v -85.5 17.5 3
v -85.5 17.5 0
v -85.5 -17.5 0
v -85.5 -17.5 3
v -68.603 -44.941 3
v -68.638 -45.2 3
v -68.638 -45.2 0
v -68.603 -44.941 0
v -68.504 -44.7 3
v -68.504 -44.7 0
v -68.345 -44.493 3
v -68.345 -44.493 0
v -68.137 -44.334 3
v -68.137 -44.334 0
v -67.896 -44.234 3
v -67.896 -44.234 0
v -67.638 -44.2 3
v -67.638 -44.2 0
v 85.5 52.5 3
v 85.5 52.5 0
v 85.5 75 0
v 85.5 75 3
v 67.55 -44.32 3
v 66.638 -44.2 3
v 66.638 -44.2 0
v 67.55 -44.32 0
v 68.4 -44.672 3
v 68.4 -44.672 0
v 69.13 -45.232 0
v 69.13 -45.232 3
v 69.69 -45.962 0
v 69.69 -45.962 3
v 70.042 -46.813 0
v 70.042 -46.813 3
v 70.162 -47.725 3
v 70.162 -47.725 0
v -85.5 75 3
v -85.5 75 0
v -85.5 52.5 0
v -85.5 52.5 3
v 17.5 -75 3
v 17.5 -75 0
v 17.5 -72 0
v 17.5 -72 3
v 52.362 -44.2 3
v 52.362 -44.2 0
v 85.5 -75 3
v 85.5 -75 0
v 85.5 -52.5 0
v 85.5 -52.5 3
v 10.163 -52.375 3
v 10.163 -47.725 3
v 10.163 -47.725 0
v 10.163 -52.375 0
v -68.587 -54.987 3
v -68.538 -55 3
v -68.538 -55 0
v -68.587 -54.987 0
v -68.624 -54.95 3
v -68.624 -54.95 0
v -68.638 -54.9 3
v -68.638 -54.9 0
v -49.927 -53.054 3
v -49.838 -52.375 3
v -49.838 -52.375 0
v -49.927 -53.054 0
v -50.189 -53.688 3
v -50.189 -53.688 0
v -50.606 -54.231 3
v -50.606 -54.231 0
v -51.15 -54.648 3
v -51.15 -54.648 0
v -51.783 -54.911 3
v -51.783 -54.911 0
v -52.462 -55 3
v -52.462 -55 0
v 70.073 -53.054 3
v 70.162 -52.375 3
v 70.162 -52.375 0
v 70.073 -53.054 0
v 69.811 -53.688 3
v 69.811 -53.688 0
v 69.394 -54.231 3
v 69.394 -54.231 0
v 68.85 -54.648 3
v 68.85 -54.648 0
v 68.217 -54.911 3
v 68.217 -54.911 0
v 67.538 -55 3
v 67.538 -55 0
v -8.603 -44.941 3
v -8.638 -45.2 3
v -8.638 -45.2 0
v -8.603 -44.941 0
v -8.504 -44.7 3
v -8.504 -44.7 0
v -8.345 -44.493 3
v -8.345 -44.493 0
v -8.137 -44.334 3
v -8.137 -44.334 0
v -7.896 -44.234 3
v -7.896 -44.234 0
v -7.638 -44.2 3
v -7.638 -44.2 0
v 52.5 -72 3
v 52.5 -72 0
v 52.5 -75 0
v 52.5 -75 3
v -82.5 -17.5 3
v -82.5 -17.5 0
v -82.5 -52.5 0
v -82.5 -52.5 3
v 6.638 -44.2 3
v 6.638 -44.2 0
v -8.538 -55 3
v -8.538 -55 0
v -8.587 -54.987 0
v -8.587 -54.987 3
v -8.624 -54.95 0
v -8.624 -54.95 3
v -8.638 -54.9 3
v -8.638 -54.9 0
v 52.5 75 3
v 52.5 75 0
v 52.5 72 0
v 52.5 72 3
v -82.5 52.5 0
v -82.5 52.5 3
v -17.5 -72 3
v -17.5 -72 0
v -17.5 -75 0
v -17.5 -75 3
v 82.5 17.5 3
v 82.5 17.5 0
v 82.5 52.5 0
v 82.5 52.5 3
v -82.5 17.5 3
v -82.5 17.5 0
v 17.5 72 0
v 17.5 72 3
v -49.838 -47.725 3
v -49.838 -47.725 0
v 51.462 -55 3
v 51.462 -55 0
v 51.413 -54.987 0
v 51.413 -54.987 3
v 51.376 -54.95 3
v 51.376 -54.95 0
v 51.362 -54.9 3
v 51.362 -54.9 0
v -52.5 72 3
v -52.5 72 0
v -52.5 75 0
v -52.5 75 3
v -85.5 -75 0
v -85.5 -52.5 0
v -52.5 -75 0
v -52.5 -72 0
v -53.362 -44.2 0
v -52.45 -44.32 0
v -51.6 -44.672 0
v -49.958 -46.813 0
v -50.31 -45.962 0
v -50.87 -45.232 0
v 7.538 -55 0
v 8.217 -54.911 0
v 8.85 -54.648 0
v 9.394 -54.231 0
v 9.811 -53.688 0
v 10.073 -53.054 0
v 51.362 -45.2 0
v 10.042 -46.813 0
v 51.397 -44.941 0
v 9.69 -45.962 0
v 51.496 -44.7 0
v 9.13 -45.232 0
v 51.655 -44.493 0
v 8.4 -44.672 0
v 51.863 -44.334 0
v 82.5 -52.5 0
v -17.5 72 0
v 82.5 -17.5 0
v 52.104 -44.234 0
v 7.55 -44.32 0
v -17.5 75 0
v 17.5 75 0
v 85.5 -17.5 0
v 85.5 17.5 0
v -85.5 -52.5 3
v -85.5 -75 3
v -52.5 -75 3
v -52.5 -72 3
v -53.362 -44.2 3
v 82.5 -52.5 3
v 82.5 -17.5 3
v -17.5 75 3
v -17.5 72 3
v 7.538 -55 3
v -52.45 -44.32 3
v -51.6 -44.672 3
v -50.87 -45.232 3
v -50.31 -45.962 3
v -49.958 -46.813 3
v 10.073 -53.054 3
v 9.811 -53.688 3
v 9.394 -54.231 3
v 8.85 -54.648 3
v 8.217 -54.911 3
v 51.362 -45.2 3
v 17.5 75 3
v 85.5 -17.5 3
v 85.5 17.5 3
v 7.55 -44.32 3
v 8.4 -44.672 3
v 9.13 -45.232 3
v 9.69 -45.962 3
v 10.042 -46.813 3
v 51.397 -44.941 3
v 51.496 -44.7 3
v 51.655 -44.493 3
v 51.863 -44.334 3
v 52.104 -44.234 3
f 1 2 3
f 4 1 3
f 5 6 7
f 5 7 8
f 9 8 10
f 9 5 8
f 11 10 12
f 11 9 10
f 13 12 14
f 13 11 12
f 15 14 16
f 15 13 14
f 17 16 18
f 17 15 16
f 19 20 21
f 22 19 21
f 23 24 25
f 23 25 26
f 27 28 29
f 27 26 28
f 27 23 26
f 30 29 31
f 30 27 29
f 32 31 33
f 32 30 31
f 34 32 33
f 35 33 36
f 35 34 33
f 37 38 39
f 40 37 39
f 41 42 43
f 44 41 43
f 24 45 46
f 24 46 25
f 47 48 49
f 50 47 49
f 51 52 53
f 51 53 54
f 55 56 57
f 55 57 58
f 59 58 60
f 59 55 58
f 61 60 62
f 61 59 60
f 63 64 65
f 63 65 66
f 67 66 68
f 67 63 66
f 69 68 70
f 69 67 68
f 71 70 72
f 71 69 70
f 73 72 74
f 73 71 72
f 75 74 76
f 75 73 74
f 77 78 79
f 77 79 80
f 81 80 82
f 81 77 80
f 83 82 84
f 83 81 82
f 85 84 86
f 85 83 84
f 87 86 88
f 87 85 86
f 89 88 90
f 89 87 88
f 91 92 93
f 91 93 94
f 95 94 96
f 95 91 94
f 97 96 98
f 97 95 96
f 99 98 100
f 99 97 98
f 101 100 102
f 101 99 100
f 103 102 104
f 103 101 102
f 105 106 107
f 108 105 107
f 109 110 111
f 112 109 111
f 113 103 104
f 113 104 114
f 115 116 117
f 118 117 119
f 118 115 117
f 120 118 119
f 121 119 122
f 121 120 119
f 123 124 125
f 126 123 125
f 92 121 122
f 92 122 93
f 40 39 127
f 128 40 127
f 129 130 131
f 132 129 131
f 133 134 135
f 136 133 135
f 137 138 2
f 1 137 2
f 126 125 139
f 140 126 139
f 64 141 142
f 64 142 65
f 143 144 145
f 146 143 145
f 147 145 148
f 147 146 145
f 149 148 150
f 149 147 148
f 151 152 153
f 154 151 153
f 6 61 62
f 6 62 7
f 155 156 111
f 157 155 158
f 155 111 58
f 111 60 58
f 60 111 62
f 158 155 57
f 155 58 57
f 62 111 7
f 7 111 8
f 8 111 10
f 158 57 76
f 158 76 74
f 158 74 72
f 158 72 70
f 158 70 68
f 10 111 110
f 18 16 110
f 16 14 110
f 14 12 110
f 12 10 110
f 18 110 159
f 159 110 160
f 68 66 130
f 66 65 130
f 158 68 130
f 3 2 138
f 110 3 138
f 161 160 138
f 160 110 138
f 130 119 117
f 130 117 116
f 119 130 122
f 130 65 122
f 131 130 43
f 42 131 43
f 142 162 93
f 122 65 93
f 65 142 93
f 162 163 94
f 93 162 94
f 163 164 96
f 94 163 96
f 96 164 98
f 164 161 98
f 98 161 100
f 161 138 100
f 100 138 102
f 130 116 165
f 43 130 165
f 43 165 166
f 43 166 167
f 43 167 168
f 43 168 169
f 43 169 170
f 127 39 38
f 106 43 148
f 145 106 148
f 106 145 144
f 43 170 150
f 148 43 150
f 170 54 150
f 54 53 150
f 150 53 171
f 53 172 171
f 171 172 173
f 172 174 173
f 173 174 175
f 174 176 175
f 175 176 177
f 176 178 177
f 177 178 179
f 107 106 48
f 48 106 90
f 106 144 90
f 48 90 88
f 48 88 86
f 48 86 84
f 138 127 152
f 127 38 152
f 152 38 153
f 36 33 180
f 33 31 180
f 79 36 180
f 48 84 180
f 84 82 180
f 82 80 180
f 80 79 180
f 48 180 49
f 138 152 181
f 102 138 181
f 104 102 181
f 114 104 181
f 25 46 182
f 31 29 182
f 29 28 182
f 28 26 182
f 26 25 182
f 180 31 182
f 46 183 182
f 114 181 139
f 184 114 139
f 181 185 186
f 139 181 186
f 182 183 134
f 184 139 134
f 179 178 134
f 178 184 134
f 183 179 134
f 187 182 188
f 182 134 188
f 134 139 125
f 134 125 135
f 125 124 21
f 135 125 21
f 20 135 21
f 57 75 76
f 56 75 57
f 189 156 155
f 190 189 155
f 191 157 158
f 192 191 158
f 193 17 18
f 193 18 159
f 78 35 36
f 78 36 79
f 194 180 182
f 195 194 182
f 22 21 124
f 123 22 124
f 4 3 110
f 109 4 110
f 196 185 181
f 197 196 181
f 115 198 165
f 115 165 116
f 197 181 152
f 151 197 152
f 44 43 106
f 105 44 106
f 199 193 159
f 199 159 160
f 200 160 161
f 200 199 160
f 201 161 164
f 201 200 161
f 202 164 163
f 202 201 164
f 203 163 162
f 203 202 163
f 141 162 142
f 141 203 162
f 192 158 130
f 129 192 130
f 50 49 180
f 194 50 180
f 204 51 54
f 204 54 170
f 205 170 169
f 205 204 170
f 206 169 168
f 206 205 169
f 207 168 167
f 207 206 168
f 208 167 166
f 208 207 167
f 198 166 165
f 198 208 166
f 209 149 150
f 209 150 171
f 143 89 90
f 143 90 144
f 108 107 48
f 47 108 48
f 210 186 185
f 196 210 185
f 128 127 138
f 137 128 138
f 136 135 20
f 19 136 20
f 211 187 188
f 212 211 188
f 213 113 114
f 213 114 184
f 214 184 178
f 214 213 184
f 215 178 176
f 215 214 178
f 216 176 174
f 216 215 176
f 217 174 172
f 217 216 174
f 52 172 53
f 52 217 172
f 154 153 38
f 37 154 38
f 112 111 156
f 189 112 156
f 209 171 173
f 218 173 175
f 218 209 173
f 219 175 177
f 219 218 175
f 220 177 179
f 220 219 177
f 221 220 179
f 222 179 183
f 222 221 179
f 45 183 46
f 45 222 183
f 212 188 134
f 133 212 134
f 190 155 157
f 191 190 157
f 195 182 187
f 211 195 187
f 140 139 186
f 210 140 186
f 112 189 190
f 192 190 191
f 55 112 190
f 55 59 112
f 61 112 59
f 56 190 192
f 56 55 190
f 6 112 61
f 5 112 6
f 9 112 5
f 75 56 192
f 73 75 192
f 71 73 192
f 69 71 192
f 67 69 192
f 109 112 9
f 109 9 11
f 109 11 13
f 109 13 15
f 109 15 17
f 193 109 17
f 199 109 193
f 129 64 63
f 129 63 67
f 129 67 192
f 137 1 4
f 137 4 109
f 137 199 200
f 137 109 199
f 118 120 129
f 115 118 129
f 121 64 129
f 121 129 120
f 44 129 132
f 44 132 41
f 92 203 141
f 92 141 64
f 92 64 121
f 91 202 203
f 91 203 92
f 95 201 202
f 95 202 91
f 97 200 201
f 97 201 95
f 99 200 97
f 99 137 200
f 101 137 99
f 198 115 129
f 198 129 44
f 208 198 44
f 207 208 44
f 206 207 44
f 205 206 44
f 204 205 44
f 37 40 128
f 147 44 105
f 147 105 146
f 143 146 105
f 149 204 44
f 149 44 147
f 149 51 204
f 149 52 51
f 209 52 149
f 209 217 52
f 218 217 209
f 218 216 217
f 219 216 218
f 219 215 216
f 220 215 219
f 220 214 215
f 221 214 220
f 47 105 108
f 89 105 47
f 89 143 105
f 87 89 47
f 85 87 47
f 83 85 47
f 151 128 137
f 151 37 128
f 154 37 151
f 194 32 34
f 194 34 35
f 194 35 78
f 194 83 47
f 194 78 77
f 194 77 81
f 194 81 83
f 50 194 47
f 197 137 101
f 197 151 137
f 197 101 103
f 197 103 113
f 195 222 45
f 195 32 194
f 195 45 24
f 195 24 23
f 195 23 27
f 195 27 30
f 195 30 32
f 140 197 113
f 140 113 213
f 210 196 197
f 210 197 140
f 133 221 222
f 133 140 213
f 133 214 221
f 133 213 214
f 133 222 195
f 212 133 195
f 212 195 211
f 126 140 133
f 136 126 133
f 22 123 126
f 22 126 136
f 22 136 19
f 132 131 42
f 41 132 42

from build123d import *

# Parameters (mm, degrees)
BOSS_EXTRUDE1_DEPTH = 3
CUT_EXTRUDE1_DEPTH  = 114.772799913


with BuildPart() as part:
    # Model → Boss-Extrude1 (new body)
    with BuildSketch(Plane.XY):
        Polygon((85.5, 75), (82.5, 75), (52.5, 75), (52.5, 72), (17.5, 72), (17.5, 75), (-17.5, 75), (-17.5, 72), (-52.5, 72), (-52.5, 75), (-82.5, 75), (-85.5, 75), (-85.5, 72), (-85.5, 52.5), (-82.5, 52.5), (-82.5, 17.5), (-85.5, 17.5), (-85.5, -17.5), (-82.5, -17.5), (-82.5, -52.5), (-85.5, -52.5), (-85.5, -72), (-85.5, -75), (-82.5, -75), (-52.5, -75), (-52.5, -72), (-17.5, -72), (-17.5, -75), (17.5, -75), (17.5, -72), (52.5, -72), (52.5, -75), (82.5, -75), (85.5, -75), (85.5, -72), (85.5, -52.5), (82.5, -52.5), (82.5, -17.5), (85.5, -17.5), (85.5, 17.5), (82.5, 17.5), (82.5, 52.5), (85.5, 52.5), (85.5, 72), align=None)
    extrude(amount=BOSS_EXTRUDE1_DEPTH)

    # Sketch1 → Cut-Extrude1 (cut, through all)
    with BuildSketch(Plane.XY.offset(3)):
        with BuildLine():
            Line((-52.4625, -55), (-68.5375, -55))
            ThreePointArc((-68.5375, -55), (-68.608210678, -54.970710678), (-68.6375, -54.9))
            Line((-68.6375, -54.9), (-68.6375, -45.2))
            ThreePointArc((-68.6375, -45.2), (-68.344606781, -44.492893219), (-67.6375, -44.2))
            Line((-67.6375, -44.2), (-53.3625, -44.2))
            ThreePointArc((-53.3625, -44.2), (-50.869948596, -45.232448596), (-49.8375, -47.725))
            Line((-49.8375, -47.725), (-49.8375, -52.375))
            ThreePointArc((-49.8375, -52.375), (-50.606344699, -54.231155301), (-52.4625, -55))
        make_face()
        with BuildLine():
            Line((7.5375, -55), (-8.5375, -55))
            ThreePointArc((-8.5375, -55), (-8.608210678, -54.970710678), (-8.6375, -54.9))
            Line((-8.6375, -54.9), (-8.6375, -45.2))
            ThreePointArc((-8.6375, -45.2), (-8.344606781, -44.492893219), (-7.6375, -44.2))
            Line((-7.6375, -44.2), (6.6375, -44.2))
            ThreePointArc((6.6375, -44.2), (9.130051404, -45.232448596), (10.1625, -47.725))
            Line((10.1625, -47.725), (10.1625, -52.375))
            ThreePointArc((10.1625, -52.375), (9.393655301, -54.231155301), (7.5375, -55))
        make_face()
        with BuildLine():
            Line((67.5375, -55), (51.4625, -55))
            ThreePointArc((51.4625, -55), (51.391789322, -54.970710678), (51.3625, -54.9))
            Line((51.3625, -54.9), (51.3625, -45.2))
            ThreePointArc((51.3625, -45.2), (51.655393219, -44.492893219), (52.3625, -44.2))
            Line((52.3625, -44.2), (66.6375, -44.2))
            ThreePointArc((66.6375, -44.2), (69.130051404, -45.232448596), (70.1625, -47.725))
            Line((70.1625, -47.725), (70.1625, -52.375))
            ThreePointArc((70.1625, -52.375), (69.393655301, -54.231155301), (67.5375, -55))
        make_face()
    extrude(amount=-CUT_EXTRUDE1_DEPTH, mode=Mode.SUBTRACT)


solid = part.part
